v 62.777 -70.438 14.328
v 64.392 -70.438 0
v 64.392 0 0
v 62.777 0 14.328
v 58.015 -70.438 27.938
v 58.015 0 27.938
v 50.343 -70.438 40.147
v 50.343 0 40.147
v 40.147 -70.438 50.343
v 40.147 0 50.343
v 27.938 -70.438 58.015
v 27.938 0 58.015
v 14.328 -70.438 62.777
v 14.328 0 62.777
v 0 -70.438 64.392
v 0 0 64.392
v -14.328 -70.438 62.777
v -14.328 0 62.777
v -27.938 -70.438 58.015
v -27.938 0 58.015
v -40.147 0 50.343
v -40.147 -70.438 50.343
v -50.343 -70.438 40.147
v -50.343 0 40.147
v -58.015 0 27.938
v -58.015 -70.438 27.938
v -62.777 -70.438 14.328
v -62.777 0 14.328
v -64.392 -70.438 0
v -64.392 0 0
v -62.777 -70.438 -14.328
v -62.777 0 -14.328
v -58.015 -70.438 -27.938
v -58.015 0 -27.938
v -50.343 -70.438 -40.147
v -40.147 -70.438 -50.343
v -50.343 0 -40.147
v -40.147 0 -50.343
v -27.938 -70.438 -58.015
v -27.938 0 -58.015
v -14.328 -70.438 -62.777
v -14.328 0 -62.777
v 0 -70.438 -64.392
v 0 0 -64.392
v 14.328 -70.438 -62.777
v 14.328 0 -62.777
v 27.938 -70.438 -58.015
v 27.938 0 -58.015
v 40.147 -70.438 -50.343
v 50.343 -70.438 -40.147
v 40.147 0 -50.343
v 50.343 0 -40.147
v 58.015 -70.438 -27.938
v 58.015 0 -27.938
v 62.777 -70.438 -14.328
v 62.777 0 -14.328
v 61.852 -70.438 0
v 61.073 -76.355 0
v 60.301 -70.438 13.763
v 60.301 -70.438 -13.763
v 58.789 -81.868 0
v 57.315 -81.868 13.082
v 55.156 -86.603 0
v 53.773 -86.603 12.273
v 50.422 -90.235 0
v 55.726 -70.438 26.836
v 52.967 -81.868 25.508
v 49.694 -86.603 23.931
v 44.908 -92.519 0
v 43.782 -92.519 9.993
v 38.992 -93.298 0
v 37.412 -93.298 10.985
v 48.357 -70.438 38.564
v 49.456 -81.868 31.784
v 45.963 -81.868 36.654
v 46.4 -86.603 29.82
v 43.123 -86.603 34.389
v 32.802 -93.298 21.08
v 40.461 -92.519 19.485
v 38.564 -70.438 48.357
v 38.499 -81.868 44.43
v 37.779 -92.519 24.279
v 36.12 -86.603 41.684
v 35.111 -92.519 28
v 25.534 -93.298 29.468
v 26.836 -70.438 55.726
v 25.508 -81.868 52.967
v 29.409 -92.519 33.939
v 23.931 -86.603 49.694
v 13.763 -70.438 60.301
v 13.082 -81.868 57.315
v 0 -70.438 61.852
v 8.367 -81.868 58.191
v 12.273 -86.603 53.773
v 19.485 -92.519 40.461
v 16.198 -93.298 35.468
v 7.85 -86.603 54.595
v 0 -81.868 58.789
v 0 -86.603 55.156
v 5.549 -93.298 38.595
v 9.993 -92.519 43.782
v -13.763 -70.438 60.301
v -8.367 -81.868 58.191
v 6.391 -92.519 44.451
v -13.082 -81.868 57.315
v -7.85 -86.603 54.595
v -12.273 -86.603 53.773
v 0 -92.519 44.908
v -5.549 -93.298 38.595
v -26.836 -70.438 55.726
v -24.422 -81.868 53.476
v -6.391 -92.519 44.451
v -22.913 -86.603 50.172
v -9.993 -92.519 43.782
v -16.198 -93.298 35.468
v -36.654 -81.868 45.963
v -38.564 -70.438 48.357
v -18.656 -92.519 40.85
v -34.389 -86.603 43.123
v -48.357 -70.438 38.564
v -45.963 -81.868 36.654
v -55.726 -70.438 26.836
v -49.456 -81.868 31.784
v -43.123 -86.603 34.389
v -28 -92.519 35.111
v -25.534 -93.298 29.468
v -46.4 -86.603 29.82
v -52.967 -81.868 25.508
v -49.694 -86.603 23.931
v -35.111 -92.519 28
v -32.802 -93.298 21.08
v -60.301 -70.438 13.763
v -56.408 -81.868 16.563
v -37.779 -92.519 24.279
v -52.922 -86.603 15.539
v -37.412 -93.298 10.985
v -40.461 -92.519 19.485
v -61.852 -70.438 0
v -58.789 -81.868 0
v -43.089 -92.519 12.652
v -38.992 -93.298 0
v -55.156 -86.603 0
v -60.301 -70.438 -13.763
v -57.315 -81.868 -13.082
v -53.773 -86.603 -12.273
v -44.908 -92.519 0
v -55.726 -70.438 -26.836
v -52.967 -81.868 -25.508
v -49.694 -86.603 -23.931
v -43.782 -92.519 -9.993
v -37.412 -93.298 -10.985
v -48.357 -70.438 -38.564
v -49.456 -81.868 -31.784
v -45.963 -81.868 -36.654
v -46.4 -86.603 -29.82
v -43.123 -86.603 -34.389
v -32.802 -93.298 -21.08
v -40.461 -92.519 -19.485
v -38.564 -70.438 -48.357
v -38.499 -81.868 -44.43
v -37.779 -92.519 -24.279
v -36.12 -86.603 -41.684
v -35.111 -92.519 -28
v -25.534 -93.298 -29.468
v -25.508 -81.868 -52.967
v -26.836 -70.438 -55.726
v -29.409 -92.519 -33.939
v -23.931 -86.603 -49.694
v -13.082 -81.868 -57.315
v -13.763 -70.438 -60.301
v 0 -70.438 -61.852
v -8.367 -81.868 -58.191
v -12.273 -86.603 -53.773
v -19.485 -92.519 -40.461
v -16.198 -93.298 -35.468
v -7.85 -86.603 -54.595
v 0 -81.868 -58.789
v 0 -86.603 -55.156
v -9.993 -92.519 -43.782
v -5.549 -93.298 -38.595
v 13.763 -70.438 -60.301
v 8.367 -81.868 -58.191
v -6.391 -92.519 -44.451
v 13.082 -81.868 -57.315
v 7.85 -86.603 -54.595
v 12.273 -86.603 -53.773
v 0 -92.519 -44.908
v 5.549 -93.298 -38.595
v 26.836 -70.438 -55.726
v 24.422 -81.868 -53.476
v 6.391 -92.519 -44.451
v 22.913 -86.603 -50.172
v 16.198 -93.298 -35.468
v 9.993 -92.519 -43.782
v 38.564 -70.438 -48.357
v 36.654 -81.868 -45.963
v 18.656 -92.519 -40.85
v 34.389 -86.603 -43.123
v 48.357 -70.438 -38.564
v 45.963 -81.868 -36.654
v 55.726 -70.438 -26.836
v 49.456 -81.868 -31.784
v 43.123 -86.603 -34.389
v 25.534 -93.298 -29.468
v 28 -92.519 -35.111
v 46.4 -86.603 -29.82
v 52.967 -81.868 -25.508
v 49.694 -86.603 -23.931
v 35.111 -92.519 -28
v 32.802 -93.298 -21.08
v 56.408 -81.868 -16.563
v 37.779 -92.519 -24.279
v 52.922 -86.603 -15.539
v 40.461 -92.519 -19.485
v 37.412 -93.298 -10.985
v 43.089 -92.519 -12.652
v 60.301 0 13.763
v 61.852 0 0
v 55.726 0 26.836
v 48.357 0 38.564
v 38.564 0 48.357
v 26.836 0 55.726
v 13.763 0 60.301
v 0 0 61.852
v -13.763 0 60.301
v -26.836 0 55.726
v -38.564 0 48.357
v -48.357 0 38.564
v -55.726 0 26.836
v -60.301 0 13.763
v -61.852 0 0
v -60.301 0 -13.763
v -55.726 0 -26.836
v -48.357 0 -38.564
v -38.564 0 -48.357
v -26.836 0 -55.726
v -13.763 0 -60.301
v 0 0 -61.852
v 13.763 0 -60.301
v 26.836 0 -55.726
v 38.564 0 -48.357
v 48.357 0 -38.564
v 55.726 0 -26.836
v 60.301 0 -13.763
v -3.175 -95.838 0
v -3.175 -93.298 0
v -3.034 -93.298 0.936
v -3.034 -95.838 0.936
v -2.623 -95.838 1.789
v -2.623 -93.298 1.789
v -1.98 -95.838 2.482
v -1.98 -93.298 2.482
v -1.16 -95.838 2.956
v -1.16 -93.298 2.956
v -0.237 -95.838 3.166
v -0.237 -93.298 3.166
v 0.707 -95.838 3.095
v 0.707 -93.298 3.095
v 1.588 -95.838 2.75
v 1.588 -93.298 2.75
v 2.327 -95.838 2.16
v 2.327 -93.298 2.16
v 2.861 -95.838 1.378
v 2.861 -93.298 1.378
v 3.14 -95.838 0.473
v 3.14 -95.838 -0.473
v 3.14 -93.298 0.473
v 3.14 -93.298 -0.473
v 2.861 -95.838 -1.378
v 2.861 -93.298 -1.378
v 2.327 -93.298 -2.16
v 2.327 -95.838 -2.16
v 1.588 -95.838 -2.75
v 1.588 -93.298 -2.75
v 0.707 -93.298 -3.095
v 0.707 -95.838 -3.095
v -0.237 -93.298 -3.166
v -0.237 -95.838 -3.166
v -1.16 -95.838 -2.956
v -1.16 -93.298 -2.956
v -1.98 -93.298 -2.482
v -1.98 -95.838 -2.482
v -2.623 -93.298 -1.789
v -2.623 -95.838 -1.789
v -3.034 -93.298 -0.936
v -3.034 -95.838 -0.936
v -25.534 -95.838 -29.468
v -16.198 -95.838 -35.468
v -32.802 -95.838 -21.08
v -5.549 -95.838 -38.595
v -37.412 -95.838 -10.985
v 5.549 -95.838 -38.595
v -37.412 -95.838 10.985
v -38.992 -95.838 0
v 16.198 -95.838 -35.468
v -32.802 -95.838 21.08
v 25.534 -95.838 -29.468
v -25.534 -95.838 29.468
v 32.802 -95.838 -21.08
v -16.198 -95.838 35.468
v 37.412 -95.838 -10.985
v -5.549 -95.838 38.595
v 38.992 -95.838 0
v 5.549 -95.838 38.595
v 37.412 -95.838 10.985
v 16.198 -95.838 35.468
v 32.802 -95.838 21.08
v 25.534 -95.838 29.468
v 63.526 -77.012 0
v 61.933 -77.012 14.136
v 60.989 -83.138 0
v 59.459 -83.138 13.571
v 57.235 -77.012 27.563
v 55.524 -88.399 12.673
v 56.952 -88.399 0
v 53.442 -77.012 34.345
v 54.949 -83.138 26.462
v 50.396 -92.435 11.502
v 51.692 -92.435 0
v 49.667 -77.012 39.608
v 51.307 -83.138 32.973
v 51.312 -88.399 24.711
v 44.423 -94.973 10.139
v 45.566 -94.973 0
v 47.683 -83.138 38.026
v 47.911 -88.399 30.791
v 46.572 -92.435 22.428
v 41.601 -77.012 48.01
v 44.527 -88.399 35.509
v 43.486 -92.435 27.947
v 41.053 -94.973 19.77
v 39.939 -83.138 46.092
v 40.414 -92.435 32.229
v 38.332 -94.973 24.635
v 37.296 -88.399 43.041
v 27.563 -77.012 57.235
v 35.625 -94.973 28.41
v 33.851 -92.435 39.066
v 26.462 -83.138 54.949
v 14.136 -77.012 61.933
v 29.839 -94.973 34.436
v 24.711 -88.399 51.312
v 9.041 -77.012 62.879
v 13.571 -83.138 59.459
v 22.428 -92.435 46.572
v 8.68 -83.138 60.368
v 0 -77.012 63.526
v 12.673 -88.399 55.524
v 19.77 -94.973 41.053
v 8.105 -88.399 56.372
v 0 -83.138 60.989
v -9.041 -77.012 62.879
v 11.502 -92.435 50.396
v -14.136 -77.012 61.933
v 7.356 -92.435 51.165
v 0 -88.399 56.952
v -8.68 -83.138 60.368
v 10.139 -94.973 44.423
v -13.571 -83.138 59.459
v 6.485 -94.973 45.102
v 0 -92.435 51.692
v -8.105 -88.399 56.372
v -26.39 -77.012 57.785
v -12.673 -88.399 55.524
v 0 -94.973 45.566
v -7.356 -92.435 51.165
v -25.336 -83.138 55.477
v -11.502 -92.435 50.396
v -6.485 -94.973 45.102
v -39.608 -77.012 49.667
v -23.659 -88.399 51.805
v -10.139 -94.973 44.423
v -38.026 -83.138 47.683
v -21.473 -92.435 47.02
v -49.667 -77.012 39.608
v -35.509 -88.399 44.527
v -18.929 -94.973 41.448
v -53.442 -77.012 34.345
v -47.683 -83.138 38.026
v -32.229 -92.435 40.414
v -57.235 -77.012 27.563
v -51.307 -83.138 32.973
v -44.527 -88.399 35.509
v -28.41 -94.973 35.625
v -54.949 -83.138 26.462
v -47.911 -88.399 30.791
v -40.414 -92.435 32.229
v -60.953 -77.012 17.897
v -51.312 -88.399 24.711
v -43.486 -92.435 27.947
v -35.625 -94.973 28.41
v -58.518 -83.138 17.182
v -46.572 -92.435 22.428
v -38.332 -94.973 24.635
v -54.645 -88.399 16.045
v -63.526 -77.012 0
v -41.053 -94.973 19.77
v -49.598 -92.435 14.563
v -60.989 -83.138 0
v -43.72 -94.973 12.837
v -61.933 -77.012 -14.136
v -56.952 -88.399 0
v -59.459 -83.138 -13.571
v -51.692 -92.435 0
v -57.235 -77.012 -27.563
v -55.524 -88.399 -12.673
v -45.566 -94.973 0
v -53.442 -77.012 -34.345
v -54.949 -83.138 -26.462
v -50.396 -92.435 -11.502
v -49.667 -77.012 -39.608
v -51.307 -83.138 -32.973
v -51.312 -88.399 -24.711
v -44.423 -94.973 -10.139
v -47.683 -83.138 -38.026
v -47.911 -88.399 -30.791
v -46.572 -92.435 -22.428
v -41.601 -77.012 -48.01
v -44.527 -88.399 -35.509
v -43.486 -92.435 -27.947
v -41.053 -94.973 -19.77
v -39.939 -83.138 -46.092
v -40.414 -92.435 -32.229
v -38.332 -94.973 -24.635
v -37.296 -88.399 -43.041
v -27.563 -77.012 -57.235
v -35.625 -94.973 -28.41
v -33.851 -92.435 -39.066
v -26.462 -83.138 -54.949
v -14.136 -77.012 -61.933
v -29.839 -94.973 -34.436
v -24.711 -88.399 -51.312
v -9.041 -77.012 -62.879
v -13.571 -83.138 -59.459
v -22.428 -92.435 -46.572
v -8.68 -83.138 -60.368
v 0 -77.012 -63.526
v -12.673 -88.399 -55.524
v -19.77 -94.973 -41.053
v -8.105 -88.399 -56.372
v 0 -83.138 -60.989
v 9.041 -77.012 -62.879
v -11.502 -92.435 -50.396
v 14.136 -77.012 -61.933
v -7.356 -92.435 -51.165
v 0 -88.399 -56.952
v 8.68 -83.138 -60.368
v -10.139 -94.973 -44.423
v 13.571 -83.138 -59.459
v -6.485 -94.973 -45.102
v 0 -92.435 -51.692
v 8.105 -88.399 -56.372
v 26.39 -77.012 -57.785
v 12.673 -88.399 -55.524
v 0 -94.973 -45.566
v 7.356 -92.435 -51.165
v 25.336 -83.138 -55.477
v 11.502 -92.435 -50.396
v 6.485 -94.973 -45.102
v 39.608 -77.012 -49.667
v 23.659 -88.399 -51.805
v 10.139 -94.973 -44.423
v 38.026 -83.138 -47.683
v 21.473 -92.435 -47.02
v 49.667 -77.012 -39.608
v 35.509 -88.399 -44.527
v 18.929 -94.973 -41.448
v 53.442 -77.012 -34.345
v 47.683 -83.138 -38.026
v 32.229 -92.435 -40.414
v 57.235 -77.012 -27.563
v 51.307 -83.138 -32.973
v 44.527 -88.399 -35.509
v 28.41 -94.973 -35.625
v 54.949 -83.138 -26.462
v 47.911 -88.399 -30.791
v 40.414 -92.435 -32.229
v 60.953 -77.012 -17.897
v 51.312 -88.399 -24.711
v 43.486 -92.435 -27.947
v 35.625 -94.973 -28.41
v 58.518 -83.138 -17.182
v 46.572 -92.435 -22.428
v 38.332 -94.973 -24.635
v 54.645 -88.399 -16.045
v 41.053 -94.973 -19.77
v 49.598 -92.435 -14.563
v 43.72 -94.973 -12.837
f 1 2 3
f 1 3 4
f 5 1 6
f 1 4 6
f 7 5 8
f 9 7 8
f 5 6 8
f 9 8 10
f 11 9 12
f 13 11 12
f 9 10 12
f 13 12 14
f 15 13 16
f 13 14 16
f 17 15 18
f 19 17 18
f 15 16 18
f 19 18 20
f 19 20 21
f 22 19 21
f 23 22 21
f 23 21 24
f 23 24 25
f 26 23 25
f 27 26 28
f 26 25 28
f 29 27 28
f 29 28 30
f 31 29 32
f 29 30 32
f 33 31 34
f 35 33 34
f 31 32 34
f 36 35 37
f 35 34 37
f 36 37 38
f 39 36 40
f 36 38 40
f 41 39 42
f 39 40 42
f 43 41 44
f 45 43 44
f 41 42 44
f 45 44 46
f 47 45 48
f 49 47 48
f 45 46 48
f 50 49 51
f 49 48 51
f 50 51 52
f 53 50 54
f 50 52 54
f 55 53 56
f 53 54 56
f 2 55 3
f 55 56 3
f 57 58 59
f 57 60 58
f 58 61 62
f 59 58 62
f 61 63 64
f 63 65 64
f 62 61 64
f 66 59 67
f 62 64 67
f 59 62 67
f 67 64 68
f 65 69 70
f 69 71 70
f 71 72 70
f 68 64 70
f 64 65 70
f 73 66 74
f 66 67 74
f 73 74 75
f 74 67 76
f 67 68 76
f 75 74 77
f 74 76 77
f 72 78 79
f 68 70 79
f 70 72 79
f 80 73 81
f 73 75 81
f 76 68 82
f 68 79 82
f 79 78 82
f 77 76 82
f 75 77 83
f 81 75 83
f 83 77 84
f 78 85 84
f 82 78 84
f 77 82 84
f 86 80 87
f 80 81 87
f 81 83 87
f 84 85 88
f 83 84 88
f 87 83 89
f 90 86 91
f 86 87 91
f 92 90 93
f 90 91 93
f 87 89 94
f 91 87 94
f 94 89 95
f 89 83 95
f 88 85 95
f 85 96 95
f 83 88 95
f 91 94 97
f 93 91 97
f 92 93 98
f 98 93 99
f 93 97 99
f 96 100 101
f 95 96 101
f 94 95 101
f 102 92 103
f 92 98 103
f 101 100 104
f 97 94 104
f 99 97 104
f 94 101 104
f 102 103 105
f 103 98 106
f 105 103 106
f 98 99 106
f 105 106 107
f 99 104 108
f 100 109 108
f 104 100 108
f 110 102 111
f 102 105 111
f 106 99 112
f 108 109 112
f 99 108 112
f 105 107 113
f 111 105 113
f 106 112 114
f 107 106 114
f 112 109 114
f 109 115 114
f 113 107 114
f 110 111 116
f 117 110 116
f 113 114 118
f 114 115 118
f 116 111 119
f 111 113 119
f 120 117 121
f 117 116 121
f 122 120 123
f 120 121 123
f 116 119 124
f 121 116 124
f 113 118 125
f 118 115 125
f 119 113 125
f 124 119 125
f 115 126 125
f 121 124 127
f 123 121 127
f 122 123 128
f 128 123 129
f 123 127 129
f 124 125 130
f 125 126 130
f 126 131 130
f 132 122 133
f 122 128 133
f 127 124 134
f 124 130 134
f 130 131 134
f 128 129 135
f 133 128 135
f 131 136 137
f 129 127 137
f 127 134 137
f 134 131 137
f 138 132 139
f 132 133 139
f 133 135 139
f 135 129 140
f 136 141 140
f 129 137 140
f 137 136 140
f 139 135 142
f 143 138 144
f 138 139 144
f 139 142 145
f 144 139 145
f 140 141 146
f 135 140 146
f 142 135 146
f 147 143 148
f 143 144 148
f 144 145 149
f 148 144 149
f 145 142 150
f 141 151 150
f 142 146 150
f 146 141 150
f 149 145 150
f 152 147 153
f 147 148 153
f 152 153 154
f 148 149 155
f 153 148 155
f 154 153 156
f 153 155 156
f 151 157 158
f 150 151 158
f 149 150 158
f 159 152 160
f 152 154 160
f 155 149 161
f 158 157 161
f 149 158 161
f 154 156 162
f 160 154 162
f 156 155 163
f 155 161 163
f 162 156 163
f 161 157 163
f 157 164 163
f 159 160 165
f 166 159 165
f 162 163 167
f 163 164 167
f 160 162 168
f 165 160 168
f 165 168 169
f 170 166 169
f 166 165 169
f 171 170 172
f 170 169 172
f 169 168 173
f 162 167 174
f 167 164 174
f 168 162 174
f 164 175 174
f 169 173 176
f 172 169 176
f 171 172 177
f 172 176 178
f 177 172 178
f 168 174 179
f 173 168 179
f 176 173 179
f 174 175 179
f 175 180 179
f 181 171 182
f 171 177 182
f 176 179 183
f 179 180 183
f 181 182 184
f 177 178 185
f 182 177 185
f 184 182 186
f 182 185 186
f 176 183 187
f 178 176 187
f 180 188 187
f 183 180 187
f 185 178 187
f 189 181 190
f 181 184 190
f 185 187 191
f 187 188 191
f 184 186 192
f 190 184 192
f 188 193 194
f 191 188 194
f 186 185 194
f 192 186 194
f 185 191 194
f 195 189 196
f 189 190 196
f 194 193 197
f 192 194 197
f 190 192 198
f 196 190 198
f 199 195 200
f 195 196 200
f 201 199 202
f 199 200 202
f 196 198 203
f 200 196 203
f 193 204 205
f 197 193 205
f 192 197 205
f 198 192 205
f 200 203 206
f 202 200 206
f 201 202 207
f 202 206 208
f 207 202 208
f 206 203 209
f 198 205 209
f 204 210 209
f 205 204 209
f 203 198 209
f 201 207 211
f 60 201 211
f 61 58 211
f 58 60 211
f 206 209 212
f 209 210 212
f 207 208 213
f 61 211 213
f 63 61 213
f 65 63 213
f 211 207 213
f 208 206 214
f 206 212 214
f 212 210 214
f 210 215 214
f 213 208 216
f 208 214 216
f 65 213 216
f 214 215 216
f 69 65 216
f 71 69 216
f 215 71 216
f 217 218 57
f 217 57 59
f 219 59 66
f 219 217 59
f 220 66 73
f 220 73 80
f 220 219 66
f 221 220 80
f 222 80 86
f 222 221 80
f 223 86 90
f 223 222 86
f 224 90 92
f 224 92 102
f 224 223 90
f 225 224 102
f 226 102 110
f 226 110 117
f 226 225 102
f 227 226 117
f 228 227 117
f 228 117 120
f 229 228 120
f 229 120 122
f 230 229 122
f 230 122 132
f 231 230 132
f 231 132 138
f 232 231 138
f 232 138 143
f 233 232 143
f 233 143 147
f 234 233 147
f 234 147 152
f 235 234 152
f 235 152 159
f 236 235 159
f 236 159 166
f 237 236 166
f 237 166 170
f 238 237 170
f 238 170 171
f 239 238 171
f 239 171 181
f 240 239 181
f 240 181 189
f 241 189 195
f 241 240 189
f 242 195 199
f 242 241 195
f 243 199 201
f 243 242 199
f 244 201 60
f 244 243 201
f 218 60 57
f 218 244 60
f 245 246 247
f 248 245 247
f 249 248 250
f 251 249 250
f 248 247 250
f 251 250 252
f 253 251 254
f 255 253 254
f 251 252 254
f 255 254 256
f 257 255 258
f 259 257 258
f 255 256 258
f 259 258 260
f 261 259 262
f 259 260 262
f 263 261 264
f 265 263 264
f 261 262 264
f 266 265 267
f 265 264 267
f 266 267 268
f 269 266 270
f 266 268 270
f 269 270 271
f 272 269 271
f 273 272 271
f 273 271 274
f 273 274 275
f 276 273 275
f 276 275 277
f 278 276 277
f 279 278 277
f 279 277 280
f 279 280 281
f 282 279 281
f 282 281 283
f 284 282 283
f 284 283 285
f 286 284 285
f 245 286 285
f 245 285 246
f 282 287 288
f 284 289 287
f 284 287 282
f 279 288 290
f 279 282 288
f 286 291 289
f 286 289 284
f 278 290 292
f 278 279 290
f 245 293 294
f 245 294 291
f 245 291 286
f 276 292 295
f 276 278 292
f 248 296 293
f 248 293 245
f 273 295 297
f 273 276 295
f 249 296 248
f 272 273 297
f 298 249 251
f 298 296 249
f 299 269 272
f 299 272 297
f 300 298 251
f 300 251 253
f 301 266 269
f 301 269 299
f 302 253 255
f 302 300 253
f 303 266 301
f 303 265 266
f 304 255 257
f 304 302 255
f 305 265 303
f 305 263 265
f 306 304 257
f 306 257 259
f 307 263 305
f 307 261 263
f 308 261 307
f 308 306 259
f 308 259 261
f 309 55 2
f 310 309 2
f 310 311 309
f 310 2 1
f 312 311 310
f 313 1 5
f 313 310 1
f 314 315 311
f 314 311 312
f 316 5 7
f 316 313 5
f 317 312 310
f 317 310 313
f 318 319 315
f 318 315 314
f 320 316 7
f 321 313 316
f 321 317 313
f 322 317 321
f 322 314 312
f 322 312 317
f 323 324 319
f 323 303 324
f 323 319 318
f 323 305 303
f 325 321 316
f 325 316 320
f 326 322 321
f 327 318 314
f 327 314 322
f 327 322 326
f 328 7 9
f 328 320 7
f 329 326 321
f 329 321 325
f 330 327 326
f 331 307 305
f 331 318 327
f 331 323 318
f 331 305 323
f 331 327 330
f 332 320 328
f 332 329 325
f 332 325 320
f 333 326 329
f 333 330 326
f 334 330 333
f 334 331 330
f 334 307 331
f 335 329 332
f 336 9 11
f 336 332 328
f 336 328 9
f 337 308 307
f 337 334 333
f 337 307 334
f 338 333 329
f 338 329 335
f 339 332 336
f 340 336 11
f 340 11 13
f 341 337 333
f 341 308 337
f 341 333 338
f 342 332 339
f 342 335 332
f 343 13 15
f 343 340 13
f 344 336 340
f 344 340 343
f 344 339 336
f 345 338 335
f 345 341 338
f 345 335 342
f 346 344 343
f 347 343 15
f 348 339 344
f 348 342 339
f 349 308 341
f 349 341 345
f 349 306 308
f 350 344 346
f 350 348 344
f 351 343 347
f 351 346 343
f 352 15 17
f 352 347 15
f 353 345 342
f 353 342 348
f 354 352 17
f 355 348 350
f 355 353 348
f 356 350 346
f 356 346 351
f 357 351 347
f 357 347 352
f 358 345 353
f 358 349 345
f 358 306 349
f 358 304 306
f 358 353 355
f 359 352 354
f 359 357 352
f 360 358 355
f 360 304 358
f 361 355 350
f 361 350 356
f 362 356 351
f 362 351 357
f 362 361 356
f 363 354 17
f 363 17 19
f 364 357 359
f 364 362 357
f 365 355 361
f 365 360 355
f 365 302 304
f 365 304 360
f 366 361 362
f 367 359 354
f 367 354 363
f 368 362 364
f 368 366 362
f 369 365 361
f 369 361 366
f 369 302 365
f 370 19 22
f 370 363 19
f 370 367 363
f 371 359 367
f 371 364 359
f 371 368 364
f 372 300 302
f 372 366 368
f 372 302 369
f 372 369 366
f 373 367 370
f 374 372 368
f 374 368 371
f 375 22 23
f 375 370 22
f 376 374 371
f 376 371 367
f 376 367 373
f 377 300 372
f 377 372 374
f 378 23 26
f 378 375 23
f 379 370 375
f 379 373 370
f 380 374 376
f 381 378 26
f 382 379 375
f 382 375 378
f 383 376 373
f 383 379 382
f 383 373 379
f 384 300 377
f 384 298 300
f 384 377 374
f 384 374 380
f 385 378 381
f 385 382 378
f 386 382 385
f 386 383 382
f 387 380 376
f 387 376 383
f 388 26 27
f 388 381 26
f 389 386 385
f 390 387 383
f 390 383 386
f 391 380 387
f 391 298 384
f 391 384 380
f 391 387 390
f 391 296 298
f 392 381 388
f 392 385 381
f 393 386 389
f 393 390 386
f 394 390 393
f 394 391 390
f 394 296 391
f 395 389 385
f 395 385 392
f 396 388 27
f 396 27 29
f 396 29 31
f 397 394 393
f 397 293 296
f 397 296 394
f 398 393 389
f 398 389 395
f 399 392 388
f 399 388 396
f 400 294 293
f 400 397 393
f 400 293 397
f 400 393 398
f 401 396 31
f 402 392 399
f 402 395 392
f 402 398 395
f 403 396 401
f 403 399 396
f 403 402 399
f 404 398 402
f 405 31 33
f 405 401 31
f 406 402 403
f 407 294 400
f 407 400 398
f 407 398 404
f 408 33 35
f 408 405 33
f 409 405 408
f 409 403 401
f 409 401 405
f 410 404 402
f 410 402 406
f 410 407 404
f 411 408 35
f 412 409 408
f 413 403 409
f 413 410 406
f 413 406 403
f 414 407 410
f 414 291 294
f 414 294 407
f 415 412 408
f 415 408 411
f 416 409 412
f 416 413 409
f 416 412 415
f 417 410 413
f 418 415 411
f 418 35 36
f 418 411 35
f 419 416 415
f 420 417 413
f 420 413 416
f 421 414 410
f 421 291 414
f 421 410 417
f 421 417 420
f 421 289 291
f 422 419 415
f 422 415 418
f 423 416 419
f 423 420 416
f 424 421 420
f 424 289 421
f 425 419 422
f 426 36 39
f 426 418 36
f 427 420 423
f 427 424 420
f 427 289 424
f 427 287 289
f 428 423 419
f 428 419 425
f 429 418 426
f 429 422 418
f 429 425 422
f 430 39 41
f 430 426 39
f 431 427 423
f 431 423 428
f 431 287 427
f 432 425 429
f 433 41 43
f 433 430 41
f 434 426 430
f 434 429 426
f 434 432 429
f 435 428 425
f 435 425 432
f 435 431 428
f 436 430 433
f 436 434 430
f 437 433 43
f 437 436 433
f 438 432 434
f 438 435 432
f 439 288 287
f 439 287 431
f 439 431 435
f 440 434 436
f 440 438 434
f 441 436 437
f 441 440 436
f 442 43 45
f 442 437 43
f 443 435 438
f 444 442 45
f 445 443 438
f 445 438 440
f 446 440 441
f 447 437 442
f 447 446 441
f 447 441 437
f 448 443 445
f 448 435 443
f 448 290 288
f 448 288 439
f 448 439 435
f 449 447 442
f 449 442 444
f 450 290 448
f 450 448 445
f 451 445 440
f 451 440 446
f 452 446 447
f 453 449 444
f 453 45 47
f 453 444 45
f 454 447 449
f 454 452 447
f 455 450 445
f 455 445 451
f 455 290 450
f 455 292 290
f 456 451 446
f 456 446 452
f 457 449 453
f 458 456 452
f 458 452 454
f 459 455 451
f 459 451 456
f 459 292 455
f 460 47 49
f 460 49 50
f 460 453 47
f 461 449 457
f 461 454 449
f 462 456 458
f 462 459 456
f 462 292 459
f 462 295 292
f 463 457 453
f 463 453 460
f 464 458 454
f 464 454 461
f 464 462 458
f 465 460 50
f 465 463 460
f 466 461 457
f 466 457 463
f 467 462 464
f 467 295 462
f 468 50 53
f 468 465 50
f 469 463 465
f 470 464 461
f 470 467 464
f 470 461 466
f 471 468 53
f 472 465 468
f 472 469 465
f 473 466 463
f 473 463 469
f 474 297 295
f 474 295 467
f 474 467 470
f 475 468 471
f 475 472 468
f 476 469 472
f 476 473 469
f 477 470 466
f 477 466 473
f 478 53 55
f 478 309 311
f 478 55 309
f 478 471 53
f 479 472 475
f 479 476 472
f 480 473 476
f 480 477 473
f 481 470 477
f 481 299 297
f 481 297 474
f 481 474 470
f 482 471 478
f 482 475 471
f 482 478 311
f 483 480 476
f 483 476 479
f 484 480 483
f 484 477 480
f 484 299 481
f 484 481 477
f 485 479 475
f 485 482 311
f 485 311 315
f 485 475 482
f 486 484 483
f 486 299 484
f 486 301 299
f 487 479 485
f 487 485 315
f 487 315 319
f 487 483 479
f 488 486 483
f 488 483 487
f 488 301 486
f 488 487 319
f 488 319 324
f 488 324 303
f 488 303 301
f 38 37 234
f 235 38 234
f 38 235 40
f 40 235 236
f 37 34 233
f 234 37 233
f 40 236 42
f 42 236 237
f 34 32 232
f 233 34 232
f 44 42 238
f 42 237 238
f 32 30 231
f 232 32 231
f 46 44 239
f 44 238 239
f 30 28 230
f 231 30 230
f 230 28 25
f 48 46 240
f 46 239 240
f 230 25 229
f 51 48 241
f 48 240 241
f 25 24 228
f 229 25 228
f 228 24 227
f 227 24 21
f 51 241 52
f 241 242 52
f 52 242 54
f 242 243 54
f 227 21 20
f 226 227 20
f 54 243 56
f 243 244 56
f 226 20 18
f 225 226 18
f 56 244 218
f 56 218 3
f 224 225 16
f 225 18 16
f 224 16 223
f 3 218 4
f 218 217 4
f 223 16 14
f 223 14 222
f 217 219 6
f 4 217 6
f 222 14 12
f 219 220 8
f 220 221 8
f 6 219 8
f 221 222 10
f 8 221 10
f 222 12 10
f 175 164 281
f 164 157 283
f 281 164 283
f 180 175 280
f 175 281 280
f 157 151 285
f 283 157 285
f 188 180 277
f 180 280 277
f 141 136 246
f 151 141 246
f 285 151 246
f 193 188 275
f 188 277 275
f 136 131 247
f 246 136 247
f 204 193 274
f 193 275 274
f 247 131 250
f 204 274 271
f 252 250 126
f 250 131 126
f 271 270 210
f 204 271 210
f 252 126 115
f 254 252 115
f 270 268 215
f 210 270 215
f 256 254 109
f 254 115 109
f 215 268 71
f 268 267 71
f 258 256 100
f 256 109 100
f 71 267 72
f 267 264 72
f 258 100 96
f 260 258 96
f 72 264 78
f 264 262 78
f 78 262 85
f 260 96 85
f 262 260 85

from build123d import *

# Parameters (mm, degrees)
F0_R     = 64.391554
F1_DEPTH = 95.8381
F2_R     = 25.4
F3_T     = -2.54
F5_D     = 6.35


with BuildPart() as f1:
    # F0 (on Front) → F1 (new body)
    with BuildSketch(Plane.XZ):
        Circle(F0_R)
    extrude(amount=F1_DEPTH)

    # F2
    f2_edges = [f1.edges().sort_by_distance(p)[0] for p in [
        (-64.391554, -95.8381, 0),
    ]]
    fillet(f2_edges, radius=F2_R)

    # F3
    f3_openings = [f1.faces().sort_by_distance(p)[0] for p in [
        (0, 0, 0),
    ]]
    offset(amount=F3_T, openings=f3_openings)

    # F5 (through all)
    with Locations(Plane.XZ.offset(95.8381)):
        with Locations((0, 0)):
            Hole(F5_D / 2)


solid = f1.part
